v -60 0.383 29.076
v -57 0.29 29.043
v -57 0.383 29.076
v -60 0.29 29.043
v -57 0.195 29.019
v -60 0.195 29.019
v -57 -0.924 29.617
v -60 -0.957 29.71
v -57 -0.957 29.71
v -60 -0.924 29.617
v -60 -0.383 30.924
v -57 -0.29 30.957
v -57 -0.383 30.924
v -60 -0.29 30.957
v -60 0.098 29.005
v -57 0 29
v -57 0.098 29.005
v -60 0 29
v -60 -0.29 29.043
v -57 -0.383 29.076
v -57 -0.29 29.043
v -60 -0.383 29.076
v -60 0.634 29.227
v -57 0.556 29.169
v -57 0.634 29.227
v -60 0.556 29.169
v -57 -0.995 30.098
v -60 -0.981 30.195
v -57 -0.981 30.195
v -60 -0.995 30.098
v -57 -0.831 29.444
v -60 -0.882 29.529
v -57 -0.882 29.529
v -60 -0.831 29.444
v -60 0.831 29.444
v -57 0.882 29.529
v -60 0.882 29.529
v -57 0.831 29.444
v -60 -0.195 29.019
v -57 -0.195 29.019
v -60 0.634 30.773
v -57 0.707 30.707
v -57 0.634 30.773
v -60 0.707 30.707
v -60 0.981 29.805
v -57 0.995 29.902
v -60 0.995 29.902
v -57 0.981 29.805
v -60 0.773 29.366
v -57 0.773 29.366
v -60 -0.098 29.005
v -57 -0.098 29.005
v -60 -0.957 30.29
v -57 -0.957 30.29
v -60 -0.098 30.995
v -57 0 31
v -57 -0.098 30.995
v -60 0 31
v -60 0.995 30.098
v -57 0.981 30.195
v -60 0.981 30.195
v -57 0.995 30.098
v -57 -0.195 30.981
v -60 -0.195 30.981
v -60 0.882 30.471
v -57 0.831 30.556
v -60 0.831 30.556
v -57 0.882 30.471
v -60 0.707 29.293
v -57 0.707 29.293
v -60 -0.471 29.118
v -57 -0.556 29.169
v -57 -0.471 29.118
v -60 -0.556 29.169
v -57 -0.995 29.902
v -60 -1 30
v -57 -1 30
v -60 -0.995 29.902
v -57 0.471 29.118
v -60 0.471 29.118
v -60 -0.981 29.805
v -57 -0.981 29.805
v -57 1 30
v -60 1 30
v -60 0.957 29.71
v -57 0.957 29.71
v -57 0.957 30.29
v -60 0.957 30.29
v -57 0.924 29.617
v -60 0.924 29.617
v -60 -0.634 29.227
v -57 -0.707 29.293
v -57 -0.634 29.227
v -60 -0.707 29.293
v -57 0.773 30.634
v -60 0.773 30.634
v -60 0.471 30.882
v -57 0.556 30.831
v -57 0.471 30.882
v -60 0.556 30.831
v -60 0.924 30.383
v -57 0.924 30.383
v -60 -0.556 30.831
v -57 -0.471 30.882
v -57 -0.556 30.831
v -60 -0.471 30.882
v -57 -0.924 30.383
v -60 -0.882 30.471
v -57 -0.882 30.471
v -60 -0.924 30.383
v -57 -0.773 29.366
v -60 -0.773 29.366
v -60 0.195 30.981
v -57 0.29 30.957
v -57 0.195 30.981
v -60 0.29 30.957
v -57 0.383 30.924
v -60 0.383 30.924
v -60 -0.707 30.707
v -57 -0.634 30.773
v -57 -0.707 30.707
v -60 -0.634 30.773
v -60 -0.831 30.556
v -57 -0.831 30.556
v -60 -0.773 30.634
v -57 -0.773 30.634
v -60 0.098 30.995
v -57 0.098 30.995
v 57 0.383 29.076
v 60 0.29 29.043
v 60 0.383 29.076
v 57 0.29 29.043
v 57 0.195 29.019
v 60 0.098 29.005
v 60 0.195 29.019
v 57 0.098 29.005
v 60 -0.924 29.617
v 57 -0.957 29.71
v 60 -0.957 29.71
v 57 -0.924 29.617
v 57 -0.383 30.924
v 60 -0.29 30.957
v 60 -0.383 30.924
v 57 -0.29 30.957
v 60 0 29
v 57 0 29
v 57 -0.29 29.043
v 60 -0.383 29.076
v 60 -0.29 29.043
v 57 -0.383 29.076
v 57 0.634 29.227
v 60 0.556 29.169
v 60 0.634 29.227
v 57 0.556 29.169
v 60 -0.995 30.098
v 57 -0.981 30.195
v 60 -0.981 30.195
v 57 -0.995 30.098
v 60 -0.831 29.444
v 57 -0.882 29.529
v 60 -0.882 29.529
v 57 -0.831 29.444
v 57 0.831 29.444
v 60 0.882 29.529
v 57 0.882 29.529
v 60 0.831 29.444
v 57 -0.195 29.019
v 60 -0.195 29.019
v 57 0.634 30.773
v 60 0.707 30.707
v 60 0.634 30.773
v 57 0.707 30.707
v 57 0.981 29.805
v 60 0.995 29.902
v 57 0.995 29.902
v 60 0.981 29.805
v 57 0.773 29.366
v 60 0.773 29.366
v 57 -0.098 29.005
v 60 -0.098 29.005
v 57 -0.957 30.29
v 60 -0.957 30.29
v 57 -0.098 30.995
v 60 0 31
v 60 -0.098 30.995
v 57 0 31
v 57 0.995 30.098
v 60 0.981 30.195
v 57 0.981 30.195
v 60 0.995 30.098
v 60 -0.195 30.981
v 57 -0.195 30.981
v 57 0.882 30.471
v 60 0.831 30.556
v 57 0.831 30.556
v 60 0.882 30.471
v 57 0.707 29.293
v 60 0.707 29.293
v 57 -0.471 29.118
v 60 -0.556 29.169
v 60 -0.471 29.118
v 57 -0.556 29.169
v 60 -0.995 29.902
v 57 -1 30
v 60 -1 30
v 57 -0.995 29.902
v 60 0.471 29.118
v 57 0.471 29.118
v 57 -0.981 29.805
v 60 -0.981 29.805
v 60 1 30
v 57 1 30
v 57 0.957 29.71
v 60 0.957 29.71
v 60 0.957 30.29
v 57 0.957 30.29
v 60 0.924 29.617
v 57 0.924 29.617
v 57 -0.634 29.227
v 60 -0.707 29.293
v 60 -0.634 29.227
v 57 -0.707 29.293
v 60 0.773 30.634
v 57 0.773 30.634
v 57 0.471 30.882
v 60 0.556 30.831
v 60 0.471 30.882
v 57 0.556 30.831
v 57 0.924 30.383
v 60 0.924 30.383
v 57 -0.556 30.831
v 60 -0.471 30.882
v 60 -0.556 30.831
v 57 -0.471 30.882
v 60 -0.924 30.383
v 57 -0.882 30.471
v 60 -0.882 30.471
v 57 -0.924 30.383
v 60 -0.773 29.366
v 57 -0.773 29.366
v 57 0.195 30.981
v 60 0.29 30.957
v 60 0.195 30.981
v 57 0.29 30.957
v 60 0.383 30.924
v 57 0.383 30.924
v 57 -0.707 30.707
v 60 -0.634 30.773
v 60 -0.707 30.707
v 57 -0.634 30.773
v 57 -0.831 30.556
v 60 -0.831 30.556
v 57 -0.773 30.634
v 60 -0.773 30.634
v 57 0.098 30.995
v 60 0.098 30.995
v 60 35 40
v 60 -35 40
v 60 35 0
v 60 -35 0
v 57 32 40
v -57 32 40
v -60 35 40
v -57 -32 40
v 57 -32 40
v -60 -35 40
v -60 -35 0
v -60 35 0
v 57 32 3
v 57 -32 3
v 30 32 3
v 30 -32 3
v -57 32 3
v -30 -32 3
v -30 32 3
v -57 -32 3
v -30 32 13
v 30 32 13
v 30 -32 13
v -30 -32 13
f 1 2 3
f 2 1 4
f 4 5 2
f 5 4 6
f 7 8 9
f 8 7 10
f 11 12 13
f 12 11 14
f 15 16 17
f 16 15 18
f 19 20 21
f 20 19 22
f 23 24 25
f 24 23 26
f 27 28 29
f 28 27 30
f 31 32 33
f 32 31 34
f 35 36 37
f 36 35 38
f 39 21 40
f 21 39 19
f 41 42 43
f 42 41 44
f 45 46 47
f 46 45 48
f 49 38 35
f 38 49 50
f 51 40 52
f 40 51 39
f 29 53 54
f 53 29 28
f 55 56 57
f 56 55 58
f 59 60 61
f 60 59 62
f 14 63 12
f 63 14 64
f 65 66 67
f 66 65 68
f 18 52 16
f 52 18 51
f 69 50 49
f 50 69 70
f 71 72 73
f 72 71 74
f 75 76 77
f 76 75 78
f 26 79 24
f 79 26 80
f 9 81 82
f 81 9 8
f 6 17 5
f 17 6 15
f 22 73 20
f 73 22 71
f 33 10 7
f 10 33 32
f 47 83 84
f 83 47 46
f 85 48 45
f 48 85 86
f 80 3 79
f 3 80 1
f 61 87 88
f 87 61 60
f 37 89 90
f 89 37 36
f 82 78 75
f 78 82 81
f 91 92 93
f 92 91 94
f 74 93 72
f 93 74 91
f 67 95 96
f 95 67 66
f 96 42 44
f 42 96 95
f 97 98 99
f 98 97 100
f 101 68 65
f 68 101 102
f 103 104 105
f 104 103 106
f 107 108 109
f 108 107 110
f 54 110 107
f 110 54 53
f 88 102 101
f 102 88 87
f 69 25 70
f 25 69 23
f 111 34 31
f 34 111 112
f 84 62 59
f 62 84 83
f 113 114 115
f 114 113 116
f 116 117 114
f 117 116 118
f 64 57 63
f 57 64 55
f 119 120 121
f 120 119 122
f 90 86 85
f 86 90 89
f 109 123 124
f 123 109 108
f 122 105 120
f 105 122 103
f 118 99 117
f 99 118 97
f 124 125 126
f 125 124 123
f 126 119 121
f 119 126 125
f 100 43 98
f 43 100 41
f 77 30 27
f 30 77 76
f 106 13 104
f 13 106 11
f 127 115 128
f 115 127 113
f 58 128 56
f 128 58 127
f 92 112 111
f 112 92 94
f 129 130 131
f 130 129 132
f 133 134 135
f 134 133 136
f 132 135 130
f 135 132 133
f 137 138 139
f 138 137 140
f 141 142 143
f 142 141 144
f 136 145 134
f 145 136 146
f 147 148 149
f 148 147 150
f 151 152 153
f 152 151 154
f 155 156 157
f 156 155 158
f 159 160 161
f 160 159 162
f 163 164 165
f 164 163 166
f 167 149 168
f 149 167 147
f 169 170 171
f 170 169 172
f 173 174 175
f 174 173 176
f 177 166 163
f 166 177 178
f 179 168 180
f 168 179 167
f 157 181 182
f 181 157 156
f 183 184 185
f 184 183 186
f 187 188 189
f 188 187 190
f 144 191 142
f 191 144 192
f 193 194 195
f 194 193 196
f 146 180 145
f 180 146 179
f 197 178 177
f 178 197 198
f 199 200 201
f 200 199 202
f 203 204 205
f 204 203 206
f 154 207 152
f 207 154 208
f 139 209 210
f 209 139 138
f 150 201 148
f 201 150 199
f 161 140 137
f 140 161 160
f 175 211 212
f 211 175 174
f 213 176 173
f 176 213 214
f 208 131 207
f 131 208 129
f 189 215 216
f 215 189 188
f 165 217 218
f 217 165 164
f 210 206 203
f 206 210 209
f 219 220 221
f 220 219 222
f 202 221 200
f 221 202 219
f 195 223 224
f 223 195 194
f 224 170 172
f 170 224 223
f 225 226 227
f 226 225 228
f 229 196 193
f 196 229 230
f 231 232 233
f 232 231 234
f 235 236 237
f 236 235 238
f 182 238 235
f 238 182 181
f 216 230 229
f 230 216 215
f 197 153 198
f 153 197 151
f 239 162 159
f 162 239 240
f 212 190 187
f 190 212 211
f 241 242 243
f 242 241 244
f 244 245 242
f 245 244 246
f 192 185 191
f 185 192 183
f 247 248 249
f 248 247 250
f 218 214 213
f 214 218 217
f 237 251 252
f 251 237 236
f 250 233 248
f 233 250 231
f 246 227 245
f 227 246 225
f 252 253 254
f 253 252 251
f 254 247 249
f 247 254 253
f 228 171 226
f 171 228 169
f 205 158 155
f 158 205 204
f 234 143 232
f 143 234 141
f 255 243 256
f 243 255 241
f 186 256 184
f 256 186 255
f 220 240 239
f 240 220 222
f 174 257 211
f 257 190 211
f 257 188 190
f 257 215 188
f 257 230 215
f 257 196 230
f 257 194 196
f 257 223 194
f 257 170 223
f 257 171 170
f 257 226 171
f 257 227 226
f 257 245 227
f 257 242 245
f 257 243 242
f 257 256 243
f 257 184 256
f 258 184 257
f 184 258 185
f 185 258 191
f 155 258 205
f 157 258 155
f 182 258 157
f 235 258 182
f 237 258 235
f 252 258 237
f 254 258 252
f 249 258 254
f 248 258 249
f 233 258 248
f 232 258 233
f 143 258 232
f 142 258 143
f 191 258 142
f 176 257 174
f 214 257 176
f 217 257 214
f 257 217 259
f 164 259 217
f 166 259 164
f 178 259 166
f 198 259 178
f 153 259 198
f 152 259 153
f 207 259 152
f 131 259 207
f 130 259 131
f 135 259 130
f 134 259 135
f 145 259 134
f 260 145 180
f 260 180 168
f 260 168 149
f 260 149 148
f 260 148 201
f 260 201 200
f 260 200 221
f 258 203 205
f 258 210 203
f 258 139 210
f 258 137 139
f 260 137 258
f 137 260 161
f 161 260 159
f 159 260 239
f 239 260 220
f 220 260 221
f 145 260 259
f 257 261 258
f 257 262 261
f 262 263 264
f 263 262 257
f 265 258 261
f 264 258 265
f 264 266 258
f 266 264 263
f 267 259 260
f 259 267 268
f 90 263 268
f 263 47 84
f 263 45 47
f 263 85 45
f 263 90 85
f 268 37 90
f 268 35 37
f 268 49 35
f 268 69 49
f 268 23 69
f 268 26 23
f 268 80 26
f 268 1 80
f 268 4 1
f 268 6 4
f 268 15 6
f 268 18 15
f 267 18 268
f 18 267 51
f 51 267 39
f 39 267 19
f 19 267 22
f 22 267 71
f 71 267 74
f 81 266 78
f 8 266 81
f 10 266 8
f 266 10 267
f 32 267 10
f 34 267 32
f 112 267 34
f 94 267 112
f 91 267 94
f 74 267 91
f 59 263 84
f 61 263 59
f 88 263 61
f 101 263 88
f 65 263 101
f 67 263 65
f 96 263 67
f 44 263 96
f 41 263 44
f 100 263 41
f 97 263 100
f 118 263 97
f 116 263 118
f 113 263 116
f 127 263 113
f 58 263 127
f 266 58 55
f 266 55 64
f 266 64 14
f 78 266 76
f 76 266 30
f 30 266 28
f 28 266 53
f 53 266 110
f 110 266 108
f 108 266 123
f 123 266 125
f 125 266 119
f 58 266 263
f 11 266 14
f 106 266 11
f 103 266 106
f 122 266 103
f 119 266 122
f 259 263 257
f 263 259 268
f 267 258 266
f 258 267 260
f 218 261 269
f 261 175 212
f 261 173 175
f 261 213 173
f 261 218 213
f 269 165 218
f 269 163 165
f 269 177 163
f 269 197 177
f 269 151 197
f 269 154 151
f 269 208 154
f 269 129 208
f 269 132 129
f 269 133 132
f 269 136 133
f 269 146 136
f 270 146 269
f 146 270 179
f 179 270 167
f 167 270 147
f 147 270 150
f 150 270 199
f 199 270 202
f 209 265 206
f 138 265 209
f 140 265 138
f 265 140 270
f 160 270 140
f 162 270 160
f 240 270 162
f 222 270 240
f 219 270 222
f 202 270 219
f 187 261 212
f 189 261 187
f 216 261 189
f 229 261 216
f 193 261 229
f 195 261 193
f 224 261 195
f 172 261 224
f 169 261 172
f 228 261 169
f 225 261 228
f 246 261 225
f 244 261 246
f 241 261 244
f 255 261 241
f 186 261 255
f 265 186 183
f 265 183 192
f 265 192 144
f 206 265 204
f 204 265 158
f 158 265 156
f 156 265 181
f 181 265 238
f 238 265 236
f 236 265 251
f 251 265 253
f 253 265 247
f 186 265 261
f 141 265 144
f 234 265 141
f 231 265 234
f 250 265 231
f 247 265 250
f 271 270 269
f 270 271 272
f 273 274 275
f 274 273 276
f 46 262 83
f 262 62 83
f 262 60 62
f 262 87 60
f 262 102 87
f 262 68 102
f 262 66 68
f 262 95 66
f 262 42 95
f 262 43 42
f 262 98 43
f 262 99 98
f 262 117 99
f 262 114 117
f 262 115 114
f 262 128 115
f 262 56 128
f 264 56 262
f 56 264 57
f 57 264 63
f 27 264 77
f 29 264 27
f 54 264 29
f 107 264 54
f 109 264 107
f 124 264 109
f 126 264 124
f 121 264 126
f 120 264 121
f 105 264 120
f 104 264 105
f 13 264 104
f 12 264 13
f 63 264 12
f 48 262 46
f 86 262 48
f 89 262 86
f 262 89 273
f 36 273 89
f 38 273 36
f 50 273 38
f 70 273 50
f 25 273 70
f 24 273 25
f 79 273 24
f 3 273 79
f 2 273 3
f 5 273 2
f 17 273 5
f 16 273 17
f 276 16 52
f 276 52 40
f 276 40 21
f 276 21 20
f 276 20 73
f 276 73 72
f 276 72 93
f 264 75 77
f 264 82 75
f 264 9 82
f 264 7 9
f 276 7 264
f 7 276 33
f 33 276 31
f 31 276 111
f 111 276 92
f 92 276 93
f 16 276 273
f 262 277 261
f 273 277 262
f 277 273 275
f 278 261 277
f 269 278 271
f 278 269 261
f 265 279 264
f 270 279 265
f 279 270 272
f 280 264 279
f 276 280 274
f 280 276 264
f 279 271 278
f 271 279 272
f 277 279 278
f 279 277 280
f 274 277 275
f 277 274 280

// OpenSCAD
// Mini horizontal gel-electrophoresis buffer tank
// Print orientation: open top facing +Z, floor on XY plane at z = 0

$fn = 64;

// ---------- Tank dimensions ----------
tank_x      = 120;   // outer length (X)
tank_y      = 70;    // outer width (Y)
tank_z      = 40;    // outer height (Z)
wall_t      = 3;     // side/end wall thickness
floor_t     = 3;     // floor thickness

// ---------- Gel tray platform ----------
plat_len_x  = 60;    // platform length along X (centred)
plat_h      = 10;    // platform height above inner floor
plat_top_z  = floor_t + plat_h;  // = 13, platform top height

// ---------- Electrode wire holes ----------
hole_d      = 2;     // wire hole diameter
hole_z      = 30;    // hole centre height
hole_y      = 0;     // hole centre Y position

// ---------- Helpers ----------
eps         = 0.5;   // overcut for clean boolean differences
inner_x     = tank_x - 2*wall_t;
inner_y     = tank_y - 2*wall_t;

union() {
    // Tank shell with wire holes
    difference() {
        // Outer block
        translate([-tank_x/2, -tank_y/2, 0])
            cube([tank_x, tank_y, tank_z]);

        // Inner cavity (open top)
        translate([-inner_x/2, -inner_y/2, floor_t])
            cube([inner_x, inner_y, tank_z - floor_t + eps]);

        // Electrode wire holes through both end walls
        for (s = [-1, 1])
            translate([s*(tank_x/2 - wall_t/2), hole_y, hole_z])
                rotate([0, 90, 0])
                    cylinder(d = hole_d, h = wall_t + 2*eps, center = true);
    }

    // Solid raised gel platform spanning full inner width
    // (slightly overlaps floor and side walls so it fuses into one solid)
    translate([-plat_len_x/2, -inner_y/2 - 0.01, floor_t - 0.01])
        cube([plat_len_x, inner_y + 0.02, plat_h + 0.01]);
}
